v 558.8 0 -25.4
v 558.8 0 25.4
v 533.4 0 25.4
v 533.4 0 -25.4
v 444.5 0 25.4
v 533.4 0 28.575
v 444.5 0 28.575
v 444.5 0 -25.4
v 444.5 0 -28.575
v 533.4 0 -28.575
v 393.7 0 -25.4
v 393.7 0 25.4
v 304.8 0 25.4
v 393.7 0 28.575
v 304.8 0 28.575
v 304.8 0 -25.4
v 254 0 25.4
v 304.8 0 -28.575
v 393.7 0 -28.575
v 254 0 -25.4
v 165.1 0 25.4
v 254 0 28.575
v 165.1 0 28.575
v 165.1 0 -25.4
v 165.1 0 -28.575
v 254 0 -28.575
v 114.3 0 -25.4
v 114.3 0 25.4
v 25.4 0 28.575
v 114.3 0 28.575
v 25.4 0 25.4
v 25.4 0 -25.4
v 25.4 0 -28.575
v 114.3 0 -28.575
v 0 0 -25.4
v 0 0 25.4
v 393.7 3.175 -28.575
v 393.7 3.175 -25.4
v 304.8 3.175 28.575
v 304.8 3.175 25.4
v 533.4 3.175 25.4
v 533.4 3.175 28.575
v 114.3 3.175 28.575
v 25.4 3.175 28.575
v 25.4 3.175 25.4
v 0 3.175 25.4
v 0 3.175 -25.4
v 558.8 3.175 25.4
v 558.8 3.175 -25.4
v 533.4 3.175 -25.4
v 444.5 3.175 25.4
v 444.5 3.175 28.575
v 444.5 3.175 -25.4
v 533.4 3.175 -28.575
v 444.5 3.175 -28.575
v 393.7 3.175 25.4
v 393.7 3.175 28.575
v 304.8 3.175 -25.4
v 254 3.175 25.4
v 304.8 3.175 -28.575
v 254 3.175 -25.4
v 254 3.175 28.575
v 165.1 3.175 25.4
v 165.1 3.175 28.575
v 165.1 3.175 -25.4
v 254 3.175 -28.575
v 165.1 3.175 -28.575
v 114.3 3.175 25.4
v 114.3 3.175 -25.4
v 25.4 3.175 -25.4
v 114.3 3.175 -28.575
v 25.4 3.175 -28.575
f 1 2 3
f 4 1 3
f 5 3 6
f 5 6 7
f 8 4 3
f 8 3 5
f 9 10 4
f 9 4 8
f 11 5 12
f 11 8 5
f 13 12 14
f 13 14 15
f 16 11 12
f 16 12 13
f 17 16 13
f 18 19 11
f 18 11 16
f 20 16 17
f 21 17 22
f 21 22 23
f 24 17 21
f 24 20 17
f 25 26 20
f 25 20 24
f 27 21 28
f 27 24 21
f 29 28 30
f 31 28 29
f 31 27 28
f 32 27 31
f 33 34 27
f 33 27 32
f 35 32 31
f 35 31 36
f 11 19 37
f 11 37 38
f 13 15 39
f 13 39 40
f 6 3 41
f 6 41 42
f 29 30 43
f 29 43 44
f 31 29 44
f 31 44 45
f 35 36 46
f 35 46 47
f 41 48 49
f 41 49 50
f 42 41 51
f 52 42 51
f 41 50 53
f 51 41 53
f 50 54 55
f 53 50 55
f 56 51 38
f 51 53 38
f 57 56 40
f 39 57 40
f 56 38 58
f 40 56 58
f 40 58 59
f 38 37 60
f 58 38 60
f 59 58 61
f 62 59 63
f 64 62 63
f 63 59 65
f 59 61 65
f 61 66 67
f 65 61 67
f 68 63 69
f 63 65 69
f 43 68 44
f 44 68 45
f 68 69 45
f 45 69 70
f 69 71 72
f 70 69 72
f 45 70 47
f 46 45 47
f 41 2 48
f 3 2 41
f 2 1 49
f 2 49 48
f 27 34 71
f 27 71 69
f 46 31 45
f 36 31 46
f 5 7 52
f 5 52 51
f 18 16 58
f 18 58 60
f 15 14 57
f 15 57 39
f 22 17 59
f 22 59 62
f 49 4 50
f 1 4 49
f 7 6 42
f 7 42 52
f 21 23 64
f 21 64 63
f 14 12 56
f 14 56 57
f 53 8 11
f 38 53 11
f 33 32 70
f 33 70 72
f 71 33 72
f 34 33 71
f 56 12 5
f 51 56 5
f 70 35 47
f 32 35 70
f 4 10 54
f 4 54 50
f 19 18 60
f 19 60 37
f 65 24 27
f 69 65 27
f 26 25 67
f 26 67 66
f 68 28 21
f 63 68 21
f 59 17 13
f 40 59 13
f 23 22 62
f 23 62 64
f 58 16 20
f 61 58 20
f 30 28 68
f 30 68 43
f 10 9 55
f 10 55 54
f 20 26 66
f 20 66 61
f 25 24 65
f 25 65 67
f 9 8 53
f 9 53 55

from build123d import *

# Parameters (mm, degrees)
BOSS_EXTRUDE1_DEPTH = 3.175


with BuildPart() as part:
    # Sketch1 → Boss-Extrude1 (new body)
    with BuildSketch(Plane(origin=(0, 0, 0), x_dir=(1, 0, 0), z_dir=(0, 1, 0))):
        Polygon((0, -25.4), (0, 25.4), (25.4, 25.4), (25.4, 28.575), (114.3, 28.575), (114.3, 25.4), (139.7, 25.4), (165.1, 25.4), (165.1, 28.575), (254, 28.575), (254, 25.4), (279.4, 25.4), (304.8, 25.4), (304.8, 28.575), (393.7, 28.575), (393.7, 25.4), (419.1, 25.4), (444.5, 25.4), (444.5, 28.575), (533.4, 28.575), (533.4, 25.4), (558.8, 25.4), (558.8, -25.4), (533.4, -25.4), (533.4, -28.575), (444.5, -28.575), (444.5, -25.4), (419.1, -25.4), (393.7, -25.4), (393.7, -28.575), (304.8, -28.575), (304.8, -25.4), (279.4, -25.4), (254, -25.4), (254, -28.575), (165.1, -28.575), (165.1, -25.4), (139.7, -25.4), (114.3, -25.4), (114.3, -28.575), (25.4, -28.575), (25.4, -25.4), align=None)
    extrude(amount=BOSS_EXTRUDE1_DEPTH)


solid = part.part
